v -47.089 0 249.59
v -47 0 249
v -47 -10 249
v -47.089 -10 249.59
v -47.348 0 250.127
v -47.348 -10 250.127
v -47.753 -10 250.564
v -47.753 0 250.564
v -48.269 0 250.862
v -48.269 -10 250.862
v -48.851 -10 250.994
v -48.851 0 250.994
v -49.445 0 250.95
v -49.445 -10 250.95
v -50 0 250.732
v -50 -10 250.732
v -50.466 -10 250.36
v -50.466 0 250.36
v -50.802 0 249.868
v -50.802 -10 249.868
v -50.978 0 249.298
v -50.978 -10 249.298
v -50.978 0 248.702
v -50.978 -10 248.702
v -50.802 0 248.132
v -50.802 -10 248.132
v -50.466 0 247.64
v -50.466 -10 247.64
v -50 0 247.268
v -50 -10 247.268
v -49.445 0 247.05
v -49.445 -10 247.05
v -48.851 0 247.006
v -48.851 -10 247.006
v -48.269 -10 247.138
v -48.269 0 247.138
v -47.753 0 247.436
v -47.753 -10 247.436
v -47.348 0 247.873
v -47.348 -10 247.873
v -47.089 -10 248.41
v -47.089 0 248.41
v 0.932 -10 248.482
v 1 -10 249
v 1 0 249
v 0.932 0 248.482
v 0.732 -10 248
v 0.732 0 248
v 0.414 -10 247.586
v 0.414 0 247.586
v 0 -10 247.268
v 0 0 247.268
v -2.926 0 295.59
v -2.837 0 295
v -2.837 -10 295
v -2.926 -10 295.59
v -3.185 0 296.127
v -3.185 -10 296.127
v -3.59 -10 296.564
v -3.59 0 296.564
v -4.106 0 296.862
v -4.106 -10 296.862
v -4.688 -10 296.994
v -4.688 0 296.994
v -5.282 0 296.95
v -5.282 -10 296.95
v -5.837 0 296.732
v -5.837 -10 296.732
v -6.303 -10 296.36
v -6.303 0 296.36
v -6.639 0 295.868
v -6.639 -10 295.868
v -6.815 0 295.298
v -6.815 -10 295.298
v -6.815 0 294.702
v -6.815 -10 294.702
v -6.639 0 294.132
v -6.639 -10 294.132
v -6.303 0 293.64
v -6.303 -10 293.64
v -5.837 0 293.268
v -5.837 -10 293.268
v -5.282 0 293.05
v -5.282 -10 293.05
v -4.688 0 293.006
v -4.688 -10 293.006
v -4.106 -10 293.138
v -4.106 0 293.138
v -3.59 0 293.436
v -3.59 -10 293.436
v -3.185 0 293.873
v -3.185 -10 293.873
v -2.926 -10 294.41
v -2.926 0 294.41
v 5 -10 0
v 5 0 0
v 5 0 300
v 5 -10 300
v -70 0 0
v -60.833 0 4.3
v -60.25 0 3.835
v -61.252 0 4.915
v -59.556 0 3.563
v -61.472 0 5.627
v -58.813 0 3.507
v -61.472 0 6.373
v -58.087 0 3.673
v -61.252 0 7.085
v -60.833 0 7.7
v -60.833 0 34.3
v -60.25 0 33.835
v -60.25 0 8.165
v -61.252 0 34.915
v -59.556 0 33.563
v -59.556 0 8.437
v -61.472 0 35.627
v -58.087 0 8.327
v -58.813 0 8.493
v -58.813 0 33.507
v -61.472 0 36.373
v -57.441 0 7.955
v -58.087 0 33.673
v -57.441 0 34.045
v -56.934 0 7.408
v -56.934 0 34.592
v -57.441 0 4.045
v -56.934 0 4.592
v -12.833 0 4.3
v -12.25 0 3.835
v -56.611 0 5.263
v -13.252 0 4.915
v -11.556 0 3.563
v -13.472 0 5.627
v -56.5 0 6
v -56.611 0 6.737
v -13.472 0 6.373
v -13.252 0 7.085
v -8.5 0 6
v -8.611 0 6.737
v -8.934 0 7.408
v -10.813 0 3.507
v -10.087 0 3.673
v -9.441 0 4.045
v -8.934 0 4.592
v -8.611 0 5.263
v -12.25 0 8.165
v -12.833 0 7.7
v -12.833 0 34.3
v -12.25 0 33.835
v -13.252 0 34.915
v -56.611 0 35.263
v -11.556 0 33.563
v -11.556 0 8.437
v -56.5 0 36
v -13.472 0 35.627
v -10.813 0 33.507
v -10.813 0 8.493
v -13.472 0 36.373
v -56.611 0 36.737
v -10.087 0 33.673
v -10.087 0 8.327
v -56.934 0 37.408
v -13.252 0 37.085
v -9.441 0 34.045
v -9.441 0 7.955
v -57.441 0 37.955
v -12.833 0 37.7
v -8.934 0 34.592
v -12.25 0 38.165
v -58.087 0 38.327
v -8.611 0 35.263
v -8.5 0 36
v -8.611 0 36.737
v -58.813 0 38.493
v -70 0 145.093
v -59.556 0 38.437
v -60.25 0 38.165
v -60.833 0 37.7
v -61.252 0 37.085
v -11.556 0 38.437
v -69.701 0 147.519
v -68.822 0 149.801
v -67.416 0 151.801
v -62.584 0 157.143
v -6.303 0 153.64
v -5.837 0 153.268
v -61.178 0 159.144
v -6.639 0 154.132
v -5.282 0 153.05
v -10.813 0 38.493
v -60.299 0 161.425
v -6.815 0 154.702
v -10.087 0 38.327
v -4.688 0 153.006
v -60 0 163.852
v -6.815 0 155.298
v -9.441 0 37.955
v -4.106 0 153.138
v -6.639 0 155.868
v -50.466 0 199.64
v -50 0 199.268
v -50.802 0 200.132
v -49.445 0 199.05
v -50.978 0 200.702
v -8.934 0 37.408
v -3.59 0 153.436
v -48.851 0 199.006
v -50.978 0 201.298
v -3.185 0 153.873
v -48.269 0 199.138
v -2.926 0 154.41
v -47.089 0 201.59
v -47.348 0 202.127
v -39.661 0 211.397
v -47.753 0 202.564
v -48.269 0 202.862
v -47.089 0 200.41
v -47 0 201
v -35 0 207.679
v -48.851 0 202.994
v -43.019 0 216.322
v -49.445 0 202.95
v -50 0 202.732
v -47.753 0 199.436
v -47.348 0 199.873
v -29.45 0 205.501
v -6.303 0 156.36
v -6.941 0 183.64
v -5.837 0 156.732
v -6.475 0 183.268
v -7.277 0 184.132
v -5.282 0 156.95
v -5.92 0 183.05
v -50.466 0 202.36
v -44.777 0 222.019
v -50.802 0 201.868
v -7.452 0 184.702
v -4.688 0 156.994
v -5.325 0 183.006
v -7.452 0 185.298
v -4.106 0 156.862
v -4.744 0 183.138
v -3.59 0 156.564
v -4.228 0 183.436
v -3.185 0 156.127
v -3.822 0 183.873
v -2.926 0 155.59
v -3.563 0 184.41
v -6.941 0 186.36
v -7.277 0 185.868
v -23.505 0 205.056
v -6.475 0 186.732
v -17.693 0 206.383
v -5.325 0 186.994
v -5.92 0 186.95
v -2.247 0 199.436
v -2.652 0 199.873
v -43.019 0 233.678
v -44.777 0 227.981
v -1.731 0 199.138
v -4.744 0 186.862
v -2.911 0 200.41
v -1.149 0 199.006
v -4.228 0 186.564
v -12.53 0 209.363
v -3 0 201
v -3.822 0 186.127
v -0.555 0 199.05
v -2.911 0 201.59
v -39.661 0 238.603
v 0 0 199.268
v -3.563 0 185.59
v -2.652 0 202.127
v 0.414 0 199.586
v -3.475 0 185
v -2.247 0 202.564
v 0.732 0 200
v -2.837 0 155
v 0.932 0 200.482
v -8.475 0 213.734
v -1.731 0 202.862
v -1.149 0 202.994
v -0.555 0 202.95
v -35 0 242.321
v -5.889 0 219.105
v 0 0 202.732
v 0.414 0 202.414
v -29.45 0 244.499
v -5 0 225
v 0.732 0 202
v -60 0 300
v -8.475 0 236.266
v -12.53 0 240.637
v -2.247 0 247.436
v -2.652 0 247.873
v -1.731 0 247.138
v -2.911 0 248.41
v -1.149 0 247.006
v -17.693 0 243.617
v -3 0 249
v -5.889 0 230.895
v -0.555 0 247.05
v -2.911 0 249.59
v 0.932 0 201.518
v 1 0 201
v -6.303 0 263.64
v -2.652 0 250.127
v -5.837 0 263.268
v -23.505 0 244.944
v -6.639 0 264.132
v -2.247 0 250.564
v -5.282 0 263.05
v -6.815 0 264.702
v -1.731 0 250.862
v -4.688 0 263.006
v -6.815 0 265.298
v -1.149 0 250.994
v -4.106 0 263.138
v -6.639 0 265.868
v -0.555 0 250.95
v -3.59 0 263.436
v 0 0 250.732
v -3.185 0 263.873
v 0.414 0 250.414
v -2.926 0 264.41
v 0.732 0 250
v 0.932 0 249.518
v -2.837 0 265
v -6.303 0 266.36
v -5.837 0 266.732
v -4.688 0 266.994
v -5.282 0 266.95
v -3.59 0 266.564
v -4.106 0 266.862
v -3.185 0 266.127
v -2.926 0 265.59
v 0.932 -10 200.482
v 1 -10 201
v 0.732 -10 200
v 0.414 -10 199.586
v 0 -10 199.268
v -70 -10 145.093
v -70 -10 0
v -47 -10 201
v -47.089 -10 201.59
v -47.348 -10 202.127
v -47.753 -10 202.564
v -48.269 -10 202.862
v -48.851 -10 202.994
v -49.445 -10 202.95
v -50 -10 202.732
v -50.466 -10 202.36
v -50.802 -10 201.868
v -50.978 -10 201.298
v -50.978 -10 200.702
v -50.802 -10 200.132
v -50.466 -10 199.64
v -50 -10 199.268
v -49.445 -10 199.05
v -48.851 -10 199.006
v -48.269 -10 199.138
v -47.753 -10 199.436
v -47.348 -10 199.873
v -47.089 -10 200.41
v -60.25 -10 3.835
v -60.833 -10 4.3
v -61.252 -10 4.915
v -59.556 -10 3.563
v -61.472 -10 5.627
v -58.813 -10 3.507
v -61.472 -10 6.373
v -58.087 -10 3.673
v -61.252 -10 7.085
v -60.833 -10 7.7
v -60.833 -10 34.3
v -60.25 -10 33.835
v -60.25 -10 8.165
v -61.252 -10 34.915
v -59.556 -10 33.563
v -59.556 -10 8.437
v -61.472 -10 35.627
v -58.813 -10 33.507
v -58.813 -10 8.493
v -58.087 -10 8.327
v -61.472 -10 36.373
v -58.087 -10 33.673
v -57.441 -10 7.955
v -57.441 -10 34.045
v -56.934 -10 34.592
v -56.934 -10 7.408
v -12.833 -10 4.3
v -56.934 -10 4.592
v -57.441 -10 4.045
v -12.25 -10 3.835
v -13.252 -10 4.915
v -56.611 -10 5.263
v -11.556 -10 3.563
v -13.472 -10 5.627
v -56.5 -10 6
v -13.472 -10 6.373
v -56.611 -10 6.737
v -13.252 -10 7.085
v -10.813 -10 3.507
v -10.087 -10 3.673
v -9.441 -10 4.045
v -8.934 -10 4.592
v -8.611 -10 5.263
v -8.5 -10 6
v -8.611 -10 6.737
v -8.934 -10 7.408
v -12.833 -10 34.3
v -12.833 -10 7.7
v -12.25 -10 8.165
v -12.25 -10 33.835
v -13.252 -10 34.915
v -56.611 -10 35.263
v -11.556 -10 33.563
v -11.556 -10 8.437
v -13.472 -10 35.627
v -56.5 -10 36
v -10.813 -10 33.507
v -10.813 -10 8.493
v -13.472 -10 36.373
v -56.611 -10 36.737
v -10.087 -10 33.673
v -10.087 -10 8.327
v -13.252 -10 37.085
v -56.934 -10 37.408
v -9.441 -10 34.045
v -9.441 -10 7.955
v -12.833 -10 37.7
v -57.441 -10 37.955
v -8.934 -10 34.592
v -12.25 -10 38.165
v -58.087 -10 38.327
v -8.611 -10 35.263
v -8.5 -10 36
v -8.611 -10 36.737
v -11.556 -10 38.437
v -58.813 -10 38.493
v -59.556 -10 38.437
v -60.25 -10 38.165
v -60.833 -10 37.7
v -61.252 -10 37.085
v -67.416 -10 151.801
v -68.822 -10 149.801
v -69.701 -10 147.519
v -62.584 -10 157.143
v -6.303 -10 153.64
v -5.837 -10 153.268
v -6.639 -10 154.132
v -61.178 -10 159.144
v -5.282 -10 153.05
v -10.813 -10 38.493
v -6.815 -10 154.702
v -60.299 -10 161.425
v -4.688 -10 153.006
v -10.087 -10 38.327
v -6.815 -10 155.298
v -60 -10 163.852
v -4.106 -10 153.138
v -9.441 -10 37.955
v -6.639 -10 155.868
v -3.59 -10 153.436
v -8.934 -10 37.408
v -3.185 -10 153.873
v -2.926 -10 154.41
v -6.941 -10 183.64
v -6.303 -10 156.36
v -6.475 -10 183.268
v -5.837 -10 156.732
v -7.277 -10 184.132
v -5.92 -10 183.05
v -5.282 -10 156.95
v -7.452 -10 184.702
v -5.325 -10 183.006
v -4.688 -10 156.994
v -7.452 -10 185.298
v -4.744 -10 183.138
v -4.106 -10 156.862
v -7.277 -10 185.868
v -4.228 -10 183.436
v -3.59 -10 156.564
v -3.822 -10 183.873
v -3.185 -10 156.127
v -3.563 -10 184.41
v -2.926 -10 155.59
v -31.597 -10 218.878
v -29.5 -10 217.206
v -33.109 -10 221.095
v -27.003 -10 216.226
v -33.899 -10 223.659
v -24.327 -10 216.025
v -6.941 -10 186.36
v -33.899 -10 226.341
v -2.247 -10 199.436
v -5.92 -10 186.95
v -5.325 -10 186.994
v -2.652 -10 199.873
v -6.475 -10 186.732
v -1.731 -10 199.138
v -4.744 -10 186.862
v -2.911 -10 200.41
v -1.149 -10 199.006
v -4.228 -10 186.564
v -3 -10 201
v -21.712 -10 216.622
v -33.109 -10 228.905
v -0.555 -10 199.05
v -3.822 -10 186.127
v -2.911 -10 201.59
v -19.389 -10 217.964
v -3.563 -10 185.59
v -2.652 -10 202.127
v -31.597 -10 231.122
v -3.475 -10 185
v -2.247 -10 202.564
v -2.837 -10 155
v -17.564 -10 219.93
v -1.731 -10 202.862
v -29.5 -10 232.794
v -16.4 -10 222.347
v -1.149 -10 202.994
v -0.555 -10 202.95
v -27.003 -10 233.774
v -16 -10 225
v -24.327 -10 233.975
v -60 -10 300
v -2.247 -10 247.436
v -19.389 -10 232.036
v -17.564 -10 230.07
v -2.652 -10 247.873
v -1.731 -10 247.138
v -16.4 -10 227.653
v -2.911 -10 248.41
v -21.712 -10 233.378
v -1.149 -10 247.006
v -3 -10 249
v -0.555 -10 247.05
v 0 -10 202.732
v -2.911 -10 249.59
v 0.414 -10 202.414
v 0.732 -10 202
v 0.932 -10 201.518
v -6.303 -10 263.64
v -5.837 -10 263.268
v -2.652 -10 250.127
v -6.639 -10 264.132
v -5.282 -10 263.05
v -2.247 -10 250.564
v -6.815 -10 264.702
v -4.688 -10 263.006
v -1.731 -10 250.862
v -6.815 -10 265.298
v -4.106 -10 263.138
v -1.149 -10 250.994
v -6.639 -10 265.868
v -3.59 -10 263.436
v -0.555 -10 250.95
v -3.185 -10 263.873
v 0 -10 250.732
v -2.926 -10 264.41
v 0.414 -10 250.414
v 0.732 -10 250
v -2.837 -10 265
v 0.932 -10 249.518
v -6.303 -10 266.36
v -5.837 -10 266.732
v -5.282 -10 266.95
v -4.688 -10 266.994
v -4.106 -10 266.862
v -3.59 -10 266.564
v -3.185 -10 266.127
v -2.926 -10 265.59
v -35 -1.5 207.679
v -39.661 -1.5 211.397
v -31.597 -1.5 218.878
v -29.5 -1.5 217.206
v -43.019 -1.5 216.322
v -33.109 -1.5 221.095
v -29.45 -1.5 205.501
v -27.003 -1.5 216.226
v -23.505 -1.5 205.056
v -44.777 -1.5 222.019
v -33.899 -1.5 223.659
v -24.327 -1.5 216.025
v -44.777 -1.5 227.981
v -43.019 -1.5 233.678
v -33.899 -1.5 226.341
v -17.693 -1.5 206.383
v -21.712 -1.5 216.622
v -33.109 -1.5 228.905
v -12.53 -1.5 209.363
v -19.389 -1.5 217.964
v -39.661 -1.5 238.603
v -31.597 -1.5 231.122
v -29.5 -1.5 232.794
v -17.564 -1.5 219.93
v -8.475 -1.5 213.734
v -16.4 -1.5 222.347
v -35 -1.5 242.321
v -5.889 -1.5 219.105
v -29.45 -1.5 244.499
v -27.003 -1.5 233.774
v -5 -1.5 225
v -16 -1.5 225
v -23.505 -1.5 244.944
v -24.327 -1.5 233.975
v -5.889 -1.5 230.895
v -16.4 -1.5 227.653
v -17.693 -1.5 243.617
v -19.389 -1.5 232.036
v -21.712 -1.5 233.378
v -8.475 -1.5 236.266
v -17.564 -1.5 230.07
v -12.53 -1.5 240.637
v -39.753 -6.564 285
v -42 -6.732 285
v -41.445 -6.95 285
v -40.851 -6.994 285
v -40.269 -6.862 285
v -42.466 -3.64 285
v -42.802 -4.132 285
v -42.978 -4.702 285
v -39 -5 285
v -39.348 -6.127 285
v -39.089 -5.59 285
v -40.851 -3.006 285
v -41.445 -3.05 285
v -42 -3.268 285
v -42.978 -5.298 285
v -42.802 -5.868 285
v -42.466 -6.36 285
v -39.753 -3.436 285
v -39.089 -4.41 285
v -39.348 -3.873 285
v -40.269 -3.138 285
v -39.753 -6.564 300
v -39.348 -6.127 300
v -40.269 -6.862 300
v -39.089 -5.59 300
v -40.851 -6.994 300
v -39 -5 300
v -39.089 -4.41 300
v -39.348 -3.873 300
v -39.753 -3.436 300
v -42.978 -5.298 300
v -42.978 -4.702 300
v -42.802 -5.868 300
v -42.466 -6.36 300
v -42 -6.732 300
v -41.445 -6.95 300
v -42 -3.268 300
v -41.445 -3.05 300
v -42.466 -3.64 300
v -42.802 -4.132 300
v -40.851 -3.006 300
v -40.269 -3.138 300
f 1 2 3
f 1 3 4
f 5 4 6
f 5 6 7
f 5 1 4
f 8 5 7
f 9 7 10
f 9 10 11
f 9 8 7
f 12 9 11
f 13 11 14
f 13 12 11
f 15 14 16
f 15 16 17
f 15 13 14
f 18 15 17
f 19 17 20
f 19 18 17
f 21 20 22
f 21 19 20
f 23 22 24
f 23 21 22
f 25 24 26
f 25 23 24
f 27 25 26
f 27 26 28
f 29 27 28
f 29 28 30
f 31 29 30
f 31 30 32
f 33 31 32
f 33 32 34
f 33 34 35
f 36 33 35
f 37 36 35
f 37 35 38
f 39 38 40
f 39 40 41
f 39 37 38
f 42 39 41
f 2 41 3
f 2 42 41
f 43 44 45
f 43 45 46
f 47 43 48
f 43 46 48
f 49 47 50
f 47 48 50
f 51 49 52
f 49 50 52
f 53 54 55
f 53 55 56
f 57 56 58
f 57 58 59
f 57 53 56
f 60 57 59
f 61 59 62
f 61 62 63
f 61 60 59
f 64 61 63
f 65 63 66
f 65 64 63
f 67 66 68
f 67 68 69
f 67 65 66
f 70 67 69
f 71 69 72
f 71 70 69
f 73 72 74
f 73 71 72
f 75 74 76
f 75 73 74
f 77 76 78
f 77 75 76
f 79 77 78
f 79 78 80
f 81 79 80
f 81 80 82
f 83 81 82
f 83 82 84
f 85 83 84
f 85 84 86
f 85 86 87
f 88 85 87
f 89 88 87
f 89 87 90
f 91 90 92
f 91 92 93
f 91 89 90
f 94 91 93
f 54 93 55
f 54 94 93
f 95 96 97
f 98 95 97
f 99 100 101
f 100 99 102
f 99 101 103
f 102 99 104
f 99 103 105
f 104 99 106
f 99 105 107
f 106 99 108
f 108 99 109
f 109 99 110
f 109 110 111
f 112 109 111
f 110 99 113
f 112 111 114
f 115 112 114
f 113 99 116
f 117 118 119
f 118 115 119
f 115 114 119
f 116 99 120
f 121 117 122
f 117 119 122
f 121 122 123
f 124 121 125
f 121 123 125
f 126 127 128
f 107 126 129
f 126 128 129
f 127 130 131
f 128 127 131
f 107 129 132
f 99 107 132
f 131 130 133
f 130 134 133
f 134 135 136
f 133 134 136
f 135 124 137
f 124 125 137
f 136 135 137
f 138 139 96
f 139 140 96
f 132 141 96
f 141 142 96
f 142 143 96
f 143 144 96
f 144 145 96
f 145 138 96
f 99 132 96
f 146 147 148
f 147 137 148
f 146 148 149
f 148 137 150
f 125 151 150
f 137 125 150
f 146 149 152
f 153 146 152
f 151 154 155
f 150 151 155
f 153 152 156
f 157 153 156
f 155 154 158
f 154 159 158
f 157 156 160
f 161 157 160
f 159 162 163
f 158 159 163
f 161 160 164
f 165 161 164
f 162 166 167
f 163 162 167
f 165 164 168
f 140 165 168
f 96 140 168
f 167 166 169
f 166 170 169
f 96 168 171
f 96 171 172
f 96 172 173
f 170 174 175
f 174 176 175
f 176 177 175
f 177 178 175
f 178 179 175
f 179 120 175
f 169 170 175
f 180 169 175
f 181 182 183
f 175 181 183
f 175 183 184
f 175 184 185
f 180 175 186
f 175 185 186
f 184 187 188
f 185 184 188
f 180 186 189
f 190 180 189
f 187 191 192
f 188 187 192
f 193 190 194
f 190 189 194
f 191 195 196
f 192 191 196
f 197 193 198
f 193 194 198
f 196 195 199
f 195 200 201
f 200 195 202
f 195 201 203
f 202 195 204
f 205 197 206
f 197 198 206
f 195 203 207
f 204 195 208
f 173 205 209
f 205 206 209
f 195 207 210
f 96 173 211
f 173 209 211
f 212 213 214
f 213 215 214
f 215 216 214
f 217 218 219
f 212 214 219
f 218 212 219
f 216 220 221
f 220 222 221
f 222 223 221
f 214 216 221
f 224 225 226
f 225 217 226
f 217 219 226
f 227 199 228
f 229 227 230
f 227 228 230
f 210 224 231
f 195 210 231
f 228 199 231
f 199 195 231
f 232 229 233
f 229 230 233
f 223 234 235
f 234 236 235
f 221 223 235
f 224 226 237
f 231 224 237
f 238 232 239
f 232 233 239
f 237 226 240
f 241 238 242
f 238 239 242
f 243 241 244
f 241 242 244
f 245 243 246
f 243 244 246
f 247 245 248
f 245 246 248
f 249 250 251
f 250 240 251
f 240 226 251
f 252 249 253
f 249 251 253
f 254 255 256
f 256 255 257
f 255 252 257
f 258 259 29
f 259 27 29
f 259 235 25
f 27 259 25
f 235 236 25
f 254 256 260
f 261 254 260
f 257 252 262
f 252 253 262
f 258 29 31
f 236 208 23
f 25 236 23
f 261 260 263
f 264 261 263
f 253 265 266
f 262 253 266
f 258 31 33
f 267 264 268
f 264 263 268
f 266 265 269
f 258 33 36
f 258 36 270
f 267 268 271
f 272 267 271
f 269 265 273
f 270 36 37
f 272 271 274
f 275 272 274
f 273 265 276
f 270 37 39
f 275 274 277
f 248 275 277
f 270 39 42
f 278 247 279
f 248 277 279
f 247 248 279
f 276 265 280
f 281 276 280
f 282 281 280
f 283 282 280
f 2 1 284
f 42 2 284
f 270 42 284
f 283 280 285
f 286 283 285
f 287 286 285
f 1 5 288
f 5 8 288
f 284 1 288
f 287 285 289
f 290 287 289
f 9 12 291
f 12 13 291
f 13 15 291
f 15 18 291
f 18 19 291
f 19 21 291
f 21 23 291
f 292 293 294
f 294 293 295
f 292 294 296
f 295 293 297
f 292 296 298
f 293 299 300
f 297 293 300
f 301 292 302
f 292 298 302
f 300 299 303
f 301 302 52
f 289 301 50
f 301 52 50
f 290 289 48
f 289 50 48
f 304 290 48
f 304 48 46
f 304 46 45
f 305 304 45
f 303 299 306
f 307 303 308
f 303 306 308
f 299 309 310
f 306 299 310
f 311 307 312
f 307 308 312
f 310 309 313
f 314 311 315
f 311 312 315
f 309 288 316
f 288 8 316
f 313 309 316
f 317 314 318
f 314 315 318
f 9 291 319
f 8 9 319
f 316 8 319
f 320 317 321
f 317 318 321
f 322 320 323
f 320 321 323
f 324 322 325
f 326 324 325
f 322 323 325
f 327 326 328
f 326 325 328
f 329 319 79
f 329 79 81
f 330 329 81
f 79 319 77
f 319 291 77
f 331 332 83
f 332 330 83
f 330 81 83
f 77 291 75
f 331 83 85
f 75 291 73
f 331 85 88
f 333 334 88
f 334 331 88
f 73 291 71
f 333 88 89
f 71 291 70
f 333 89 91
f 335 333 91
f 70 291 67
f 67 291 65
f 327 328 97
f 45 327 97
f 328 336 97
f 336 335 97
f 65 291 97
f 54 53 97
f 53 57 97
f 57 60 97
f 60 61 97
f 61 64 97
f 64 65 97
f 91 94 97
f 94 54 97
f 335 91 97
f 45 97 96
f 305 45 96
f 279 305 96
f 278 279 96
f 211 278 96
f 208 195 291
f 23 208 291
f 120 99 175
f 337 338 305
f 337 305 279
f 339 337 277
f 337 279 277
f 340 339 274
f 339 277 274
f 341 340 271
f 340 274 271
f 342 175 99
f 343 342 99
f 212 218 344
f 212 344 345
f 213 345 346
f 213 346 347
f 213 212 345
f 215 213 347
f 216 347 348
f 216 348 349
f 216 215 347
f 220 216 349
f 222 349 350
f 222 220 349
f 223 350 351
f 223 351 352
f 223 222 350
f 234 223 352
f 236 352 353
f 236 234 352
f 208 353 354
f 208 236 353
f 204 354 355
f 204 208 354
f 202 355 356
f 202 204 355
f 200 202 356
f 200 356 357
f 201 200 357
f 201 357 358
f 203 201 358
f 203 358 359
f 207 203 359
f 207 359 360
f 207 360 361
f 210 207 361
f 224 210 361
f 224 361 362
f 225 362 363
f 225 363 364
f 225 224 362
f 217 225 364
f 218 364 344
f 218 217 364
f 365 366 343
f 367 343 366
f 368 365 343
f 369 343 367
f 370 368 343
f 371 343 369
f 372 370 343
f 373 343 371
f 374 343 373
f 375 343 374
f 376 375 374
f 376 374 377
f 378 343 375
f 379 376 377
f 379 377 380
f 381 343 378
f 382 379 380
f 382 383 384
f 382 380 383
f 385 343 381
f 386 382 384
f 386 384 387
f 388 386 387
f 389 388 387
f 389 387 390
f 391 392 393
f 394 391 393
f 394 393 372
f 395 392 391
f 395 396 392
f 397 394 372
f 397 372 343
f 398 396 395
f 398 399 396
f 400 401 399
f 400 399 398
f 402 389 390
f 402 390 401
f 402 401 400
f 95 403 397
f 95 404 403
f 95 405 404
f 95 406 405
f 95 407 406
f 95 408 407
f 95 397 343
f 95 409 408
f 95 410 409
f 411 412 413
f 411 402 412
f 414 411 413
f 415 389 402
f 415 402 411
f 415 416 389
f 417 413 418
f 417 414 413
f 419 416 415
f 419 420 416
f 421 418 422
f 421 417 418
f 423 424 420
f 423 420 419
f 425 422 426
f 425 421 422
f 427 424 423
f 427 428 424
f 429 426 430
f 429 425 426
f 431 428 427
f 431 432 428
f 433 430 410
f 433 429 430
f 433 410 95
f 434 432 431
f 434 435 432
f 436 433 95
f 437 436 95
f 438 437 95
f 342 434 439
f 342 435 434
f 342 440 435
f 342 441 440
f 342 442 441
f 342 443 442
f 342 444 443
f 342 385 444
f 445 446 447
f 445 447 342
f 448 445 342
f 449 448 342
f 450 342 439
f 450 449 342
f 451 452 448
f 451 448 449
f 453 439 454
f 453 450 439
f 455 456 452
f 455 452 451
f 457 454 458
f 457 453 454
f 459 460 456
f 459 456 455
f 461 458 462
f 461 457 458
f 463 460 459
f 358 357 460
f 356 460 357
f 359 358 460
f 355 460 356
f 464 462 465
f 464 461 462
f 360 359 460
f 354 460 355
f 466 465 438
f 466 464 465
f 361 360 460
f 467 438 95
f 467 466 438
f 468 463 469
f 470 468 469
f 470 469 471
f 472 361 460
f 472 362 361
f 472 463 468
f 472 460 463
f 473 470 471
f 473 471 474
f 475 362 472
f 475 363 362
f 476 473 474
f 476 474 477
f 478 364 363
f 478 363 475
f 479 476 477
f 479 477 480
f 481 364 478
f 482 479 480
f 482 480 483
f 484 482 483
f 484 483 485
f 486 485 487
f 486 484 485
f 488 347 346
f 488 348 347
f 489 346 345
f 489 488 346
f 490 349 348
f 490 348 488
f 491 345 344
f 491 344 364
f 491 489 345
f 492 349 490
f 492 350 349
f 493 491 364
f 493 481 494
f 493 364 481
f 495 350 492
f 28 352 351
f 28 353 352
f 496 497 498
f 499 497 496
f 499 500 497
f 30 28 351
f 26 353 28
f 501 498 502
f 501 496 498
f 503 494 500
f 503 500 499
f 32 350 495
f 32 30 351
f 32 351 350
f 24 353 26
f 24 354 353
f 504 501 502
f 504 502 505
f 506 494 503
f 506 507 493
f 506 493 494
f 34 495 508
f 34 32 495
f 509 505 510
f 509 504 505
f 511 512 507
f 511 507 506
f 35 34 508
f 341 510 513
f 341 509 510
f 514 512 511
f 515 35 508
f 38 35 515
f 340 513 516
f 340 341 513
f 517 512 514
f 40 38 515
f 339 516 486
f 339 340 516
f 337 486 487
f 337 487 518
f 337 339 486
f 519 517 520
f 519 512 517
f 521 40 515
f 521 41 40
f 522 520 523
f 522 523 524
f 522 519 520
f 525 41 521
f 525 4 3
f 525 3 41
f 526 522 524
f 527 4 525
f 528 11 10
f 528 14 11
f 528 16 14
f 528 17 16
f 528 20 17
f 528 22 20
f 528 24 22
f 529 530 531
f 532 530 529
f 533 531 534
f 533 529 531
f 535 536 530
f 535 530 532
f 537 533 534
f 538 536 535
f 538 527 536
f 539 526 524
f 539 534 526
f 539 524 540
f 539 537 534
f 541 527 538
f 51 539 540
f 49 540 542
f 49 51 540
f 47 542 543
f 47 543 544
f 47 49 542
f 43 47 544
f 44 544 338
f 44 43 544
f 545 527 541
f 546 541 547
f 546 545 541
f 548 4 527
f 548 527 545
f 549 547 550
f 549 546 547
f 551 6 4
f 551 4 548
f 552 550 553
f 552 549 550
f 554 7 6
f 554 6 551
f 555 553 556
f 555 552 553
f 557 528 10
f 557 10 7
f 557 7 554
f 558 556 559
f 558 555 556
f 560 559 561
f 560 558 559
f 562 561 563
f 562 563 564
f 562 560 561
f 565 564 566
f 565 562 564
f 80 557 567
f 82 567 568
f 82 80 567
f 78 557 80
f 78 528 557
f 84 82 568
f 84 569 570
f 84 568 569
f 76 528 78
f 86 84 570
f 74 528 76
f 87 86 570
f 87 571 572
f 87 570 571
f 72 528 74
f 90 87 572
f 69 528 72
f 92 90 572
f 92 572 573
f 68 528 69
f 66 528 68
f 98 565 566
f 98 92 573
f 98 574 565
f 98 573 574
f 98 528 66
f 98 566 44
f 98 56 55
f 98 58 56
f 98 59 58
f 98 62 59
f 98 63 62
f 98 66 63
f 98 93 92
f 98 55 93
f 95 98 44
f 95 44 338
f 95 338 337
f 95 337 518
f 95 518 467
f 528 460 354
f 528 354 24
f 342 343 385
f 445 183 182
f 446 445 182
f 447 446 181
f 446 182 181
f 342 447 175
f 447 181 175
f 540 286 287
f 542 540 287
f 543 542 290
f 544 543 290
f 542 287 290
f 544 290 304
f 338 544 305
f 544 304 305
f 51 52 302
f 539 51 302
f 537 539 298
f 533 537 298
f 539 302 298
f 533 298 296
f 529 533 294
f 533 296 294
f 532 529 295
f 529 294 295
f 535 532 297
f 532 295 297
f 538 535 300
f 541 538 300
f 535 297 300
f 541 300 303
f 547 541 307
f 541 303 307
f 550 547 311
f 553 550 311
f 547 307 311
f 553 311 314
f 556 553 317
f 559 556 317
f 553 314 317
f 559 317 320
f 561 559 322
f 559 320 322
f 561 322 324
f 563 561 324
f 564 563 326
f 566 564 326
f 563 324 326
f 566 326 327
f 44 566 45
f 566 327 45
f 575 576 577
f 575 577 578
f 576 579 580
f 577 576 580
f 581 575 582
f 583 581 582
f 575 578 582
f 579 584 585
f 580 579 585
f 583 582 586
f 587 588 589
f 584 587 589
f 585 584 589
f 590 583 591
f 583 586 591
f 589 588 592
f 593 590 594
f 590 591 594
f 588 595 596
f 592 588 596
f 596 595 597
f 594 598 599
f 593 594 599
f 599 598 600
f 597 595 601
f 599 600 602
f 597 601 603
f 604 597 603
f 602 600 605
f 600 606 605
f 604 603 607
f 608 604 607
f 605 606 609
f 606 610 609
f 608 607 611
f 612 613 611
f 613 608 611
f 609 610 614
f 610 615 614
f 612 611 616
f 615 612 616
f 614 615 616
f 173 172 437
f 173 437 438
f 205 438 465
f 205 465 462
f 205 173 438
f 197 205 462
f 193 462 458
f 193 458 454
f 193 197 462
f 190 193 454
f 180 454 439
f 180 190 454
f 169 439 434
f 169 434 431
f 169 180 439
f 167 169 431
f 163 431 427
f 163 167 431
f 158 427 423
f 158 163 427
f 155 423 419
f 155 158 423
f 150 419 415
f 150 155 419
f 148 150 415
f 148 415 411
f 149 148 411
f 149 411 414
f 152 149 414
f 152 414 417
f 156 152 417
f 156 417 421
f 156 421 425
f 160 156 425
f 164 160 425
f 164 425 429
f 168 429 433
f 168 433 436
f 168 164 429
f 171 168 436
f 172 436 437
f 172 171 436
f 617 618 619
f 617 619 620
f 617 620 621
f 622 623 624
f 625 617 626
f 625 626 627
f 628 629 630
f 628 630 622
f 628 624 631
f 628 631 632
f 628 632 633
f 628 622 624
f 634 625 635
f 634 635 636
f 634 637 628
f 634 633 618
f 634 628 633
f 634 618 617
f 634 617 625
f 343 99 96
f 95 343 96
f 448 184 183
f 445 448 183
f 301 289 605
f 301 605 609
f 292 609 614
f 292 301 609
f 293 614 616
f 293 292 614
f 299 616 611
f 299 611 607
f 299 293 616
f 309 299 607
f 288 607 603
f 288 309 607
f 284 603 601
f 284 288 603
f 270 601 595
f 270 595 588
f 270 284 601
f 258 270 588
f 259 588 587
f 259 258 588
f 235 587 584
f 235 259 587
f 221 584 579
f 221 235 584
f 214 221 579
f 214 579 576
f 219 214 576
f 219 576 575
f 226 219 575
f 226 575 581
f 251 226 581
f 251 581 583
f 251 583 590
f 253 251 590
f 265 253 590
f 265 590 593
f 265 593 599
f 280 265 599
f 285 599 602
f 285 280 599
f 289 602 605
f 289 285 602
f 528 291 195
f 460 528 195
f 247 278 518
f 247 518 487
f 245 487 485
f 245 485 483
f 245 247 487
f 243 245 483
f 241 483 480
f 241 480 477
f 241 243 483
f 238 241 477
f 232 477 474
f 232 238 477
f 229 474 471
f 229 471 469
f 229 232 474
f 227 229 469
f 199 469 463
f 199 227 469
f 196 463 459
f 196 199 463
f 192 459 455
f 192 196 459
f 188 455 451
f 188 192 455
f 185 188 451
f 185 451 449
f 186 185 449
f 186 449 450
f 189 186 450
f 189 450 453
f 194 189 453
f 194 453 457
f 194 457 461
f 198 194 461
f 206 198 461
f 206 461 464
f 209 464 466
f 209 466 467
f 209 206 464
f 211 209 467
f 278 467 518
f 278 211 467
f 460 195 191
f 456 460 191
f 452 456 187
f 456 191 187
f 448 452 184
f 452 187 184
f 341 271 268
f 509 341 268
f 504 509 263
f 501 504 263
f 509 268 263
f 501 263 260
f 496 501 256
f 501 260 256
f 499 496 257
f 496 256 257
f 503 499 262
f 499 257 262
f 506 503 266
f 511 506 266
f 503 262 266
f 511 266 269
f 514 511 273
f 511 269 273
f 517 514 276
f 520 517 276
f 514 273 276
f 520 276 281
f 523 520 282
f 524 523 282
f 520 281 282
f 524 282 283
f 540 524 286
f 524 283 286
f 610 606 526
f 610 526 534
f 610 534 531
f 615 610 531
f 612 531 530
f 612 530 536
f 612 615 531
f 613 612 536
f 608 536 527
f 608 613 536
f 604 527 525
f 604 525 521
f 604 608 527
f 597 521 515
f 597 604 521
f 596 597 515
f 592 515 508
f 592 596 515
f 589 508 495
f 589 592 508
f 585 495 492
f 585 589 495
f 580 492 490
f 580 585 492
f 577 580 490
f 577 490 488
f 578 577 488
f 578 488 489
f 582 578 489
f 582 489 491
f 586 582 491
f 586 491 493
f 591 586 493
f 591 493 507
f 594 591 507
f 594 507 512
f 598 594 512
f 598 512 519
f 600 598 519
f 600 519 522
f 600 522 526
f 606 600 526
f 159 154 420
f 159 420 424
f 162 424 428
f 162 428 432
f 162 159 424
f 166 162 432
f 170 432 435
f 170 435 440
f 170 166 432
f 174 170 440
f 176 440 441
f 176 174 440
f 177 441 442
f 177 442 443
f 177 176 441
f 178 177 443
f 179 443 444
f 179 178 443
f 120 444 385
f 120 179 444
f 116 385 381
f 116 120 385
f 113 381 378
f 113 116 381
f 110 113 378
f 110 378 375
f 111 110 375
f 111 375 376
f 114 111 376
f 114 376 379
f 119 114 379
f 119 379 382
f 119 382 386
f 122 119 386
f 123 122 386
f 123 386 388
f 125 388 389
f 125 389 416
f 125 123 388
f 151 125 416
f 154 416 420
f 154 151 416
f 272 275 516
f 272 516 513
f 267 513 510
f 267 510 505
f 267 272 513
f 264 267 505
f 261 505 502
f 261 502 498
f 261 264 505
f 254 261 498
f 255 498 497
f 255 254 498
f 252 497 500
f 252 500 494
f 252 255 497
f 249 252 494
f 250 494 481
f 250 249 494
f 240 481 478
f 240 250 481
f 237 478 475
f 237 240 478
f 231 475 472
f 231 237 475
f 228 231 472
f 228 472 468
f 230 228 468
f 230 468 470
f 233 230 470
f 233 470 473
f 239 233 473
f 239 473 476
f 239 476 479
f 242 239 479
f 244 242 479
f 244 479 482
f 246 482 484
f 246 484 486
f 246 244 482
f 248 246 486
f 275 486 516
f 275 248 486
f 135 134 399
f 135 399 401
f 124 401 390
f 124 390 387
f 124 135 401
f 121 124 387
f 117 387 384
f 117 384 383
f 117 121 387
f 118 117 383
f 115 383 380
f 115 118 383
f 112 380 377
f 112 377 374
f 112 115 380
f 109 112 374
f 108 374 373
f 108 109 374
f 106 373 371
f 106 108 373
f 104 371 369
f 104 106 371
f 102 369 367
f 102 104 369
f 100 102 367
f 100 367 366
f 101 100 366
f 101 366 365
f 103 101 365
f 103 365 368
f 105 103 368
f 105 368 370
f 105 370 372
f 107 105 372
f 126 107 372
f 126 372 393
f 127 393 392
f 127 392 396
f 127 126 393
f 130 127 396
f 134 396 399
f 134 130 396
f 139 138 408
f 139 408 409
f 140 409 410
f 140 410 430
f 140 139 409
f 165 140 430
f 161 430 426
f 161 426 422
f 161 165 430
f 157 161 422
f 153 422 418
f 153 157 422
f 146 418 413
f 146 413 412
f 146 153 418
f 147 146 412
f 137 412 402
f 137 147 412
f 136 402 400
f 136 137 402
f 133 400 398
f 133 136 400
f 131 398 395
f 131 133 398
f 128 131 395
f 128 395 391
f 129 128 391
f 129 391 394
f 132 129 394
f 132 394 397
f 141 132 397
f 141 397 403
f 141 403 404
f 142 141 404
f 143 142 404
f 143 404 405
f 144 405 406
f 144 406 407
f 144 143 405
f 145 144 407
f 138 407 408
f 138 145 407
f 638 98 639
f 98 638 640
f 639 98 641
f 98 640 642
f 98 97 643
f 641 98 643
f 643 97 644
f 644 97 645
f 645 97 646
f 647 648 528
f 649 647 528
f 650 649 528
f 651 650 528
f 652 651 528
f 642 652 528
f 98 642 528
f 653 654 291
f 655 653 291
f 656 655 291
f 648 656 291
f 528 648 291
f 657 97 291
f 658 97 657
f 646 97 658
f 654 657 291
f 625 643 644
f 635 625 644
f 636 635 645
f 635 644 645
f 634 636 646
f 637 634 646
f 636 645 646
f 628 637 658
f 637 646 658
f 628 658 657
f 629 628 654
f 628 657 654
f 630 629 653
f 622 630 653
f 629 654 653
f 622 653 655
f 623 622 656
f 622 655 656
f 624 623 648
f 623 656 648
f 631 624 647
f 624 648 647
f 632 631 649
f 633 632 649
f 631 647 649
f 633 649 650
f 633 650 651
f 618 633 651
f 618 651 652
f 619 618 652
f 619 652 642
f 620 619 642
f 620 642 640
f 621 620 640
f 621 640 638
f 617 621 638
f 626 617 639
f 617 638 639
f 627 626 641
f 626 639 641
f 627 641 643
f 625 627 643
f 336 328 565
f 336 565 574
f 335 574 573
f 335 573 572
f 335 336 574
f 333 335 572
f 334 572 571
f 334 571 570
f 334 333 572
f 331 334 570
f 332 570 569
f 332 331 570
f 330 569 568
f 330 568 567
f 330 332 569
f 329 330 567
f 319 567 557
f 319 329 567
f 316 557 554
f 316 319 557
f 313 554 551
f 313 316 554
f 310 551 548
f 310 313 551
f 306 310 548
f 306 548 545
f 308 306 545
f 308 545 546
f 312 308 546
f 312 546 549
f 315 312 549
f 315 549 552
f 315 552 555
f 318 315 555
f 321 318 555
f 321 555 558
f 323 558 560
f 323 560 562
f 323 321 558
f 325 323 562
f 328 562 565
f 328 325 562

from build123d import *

# Parameters (mm, degrees)
F0_R     = 2.5
F0_R_2   = 2
F0_R_3   = 20
F0_R_4   = 9
F1_DEPTH = 10
F2_R     = 2
F3_DEPTH = 15
F4_DEPTH = 1.5


with BuildPart() as f1:
    # F0 (on Front) → F1 (new body)
    with BuildSketch(Plane.XZ):
        with BuildLine():
            Line((-70, 0), (0, 0))
            Line((0, 0), (0, 199.267949))
            ThreePointArc((0, 199.267949), (-3, 201), (0, 202.732051))
            Line((0, 202.732051), (0, 247.267949))
            ThreePointArc((0, 247.267949), (-3, 249), (0, 250.732051))
            Line((0, 250.732051), (0, 300))
            Line((0, 300), (-60, 300))
            Line((-60, 300), (-60, 163.85171))
            ThreePointArc((-60, 163.85171), (-60.668282, 160.257403), (-62.583808, 157.143498))
            Line((-62.583808, 157.143498), (-67.416192, 151.801108))
            ThreePointArc((-67.416192, 151.801108), (-69.331718, 148.687203), (-70, 145.092897))
            Line((-70, 145.092897), (-70, 0))
        make_face()
        with Locations((-59, 6)):
            Circle(F0_R, mode=Mode.SUBTRACT)
        with Locations((-59, 36)):
            Circle(F0_R, mode=Mode.SUBTRACT)
        with Locations((-11, 6)):
            Circle(F0_R, mode=Mode.SUBTRACT)
        with Locations((-11, 36)):
            Circle(F0_R, mode=Mode.SUBTRACT)
        with Locations((-49, 201)):
            Circle(F0_R_2, mode=Mode.SUBTRACT)
        with Locations((-49, 249)):
            Circle(F0_R_2, mode=Mode.SUBTRACT)
        with Locations((-4.837179, 155)):
            Circle(F0_R_2, mode=Mode.SUBTRACT)
        with Locations((-5.474639, 185)):
            Circle(F0_R_2, mode=Mode.SUBTRACT)
        with Locations((-25, 225)):
            Circle(F0_R_3, mode=Mode.SUBTRACT)
        with Locations((-4.837179, 265)):
            Circle(F0_R_2, mode=Mode.SUBTRACT)
        with Locations((-4.837179, 295)):
            Circle(F0_R_2, mode=Mode.SUBTRACT)
        with Locations((-25, 225)):
            Circle(F0_R_3)
        with Locations((-25, 225)):
            Circle(F0_R_4, mode=Mode.SUBTRACT)
        with BuildLine():
            Line((0, 199.267949), (0, 0))
            Line((0, 0), (5, 0))
            Line((5, 0), (5, 300))
            Line((5, 300), (0, 300))
            Line((0, 300), (0, 250.732051))
            ThreePointArc((0, 250.732051), (0.732051, 250), (1, 249))
            ThreePointArc((1, 249), (0.732051, 248), (0, 247.267949))
            Line((0, 247.267949), (0, 202.732051))
            ThreePointArc((0, 202.732051), (0.732051, 202), (1, 201))
            ThreePointArc((1, 201), (0.732051, 200), (0, 199.267949))
        make_face()
    extrude(amount=F1_DEPTH)

    # F2 (on face) → F3 (cut)
    with BuildSketch(Plane.XY.offset(300)):
        with Locations((-41, -5)):
            Circle(F2_R)
    extrude(amount=-F3_DEPTH, mode=Mode.SUBTRACT)

    # F0 (on Front) → F4 (cut)
    with BuildSketch(Plane.XZ):
        with Locations((-25, 225)):
            Circle(F0_R_3)
        with Locations((-25, 225)):
            Circle(F0_R_4, mode=Mode.SUBTRACT)
    extrude(amount=F4_DEPTH, mode=Mode.SUBTRACT)


solid = f1.part
